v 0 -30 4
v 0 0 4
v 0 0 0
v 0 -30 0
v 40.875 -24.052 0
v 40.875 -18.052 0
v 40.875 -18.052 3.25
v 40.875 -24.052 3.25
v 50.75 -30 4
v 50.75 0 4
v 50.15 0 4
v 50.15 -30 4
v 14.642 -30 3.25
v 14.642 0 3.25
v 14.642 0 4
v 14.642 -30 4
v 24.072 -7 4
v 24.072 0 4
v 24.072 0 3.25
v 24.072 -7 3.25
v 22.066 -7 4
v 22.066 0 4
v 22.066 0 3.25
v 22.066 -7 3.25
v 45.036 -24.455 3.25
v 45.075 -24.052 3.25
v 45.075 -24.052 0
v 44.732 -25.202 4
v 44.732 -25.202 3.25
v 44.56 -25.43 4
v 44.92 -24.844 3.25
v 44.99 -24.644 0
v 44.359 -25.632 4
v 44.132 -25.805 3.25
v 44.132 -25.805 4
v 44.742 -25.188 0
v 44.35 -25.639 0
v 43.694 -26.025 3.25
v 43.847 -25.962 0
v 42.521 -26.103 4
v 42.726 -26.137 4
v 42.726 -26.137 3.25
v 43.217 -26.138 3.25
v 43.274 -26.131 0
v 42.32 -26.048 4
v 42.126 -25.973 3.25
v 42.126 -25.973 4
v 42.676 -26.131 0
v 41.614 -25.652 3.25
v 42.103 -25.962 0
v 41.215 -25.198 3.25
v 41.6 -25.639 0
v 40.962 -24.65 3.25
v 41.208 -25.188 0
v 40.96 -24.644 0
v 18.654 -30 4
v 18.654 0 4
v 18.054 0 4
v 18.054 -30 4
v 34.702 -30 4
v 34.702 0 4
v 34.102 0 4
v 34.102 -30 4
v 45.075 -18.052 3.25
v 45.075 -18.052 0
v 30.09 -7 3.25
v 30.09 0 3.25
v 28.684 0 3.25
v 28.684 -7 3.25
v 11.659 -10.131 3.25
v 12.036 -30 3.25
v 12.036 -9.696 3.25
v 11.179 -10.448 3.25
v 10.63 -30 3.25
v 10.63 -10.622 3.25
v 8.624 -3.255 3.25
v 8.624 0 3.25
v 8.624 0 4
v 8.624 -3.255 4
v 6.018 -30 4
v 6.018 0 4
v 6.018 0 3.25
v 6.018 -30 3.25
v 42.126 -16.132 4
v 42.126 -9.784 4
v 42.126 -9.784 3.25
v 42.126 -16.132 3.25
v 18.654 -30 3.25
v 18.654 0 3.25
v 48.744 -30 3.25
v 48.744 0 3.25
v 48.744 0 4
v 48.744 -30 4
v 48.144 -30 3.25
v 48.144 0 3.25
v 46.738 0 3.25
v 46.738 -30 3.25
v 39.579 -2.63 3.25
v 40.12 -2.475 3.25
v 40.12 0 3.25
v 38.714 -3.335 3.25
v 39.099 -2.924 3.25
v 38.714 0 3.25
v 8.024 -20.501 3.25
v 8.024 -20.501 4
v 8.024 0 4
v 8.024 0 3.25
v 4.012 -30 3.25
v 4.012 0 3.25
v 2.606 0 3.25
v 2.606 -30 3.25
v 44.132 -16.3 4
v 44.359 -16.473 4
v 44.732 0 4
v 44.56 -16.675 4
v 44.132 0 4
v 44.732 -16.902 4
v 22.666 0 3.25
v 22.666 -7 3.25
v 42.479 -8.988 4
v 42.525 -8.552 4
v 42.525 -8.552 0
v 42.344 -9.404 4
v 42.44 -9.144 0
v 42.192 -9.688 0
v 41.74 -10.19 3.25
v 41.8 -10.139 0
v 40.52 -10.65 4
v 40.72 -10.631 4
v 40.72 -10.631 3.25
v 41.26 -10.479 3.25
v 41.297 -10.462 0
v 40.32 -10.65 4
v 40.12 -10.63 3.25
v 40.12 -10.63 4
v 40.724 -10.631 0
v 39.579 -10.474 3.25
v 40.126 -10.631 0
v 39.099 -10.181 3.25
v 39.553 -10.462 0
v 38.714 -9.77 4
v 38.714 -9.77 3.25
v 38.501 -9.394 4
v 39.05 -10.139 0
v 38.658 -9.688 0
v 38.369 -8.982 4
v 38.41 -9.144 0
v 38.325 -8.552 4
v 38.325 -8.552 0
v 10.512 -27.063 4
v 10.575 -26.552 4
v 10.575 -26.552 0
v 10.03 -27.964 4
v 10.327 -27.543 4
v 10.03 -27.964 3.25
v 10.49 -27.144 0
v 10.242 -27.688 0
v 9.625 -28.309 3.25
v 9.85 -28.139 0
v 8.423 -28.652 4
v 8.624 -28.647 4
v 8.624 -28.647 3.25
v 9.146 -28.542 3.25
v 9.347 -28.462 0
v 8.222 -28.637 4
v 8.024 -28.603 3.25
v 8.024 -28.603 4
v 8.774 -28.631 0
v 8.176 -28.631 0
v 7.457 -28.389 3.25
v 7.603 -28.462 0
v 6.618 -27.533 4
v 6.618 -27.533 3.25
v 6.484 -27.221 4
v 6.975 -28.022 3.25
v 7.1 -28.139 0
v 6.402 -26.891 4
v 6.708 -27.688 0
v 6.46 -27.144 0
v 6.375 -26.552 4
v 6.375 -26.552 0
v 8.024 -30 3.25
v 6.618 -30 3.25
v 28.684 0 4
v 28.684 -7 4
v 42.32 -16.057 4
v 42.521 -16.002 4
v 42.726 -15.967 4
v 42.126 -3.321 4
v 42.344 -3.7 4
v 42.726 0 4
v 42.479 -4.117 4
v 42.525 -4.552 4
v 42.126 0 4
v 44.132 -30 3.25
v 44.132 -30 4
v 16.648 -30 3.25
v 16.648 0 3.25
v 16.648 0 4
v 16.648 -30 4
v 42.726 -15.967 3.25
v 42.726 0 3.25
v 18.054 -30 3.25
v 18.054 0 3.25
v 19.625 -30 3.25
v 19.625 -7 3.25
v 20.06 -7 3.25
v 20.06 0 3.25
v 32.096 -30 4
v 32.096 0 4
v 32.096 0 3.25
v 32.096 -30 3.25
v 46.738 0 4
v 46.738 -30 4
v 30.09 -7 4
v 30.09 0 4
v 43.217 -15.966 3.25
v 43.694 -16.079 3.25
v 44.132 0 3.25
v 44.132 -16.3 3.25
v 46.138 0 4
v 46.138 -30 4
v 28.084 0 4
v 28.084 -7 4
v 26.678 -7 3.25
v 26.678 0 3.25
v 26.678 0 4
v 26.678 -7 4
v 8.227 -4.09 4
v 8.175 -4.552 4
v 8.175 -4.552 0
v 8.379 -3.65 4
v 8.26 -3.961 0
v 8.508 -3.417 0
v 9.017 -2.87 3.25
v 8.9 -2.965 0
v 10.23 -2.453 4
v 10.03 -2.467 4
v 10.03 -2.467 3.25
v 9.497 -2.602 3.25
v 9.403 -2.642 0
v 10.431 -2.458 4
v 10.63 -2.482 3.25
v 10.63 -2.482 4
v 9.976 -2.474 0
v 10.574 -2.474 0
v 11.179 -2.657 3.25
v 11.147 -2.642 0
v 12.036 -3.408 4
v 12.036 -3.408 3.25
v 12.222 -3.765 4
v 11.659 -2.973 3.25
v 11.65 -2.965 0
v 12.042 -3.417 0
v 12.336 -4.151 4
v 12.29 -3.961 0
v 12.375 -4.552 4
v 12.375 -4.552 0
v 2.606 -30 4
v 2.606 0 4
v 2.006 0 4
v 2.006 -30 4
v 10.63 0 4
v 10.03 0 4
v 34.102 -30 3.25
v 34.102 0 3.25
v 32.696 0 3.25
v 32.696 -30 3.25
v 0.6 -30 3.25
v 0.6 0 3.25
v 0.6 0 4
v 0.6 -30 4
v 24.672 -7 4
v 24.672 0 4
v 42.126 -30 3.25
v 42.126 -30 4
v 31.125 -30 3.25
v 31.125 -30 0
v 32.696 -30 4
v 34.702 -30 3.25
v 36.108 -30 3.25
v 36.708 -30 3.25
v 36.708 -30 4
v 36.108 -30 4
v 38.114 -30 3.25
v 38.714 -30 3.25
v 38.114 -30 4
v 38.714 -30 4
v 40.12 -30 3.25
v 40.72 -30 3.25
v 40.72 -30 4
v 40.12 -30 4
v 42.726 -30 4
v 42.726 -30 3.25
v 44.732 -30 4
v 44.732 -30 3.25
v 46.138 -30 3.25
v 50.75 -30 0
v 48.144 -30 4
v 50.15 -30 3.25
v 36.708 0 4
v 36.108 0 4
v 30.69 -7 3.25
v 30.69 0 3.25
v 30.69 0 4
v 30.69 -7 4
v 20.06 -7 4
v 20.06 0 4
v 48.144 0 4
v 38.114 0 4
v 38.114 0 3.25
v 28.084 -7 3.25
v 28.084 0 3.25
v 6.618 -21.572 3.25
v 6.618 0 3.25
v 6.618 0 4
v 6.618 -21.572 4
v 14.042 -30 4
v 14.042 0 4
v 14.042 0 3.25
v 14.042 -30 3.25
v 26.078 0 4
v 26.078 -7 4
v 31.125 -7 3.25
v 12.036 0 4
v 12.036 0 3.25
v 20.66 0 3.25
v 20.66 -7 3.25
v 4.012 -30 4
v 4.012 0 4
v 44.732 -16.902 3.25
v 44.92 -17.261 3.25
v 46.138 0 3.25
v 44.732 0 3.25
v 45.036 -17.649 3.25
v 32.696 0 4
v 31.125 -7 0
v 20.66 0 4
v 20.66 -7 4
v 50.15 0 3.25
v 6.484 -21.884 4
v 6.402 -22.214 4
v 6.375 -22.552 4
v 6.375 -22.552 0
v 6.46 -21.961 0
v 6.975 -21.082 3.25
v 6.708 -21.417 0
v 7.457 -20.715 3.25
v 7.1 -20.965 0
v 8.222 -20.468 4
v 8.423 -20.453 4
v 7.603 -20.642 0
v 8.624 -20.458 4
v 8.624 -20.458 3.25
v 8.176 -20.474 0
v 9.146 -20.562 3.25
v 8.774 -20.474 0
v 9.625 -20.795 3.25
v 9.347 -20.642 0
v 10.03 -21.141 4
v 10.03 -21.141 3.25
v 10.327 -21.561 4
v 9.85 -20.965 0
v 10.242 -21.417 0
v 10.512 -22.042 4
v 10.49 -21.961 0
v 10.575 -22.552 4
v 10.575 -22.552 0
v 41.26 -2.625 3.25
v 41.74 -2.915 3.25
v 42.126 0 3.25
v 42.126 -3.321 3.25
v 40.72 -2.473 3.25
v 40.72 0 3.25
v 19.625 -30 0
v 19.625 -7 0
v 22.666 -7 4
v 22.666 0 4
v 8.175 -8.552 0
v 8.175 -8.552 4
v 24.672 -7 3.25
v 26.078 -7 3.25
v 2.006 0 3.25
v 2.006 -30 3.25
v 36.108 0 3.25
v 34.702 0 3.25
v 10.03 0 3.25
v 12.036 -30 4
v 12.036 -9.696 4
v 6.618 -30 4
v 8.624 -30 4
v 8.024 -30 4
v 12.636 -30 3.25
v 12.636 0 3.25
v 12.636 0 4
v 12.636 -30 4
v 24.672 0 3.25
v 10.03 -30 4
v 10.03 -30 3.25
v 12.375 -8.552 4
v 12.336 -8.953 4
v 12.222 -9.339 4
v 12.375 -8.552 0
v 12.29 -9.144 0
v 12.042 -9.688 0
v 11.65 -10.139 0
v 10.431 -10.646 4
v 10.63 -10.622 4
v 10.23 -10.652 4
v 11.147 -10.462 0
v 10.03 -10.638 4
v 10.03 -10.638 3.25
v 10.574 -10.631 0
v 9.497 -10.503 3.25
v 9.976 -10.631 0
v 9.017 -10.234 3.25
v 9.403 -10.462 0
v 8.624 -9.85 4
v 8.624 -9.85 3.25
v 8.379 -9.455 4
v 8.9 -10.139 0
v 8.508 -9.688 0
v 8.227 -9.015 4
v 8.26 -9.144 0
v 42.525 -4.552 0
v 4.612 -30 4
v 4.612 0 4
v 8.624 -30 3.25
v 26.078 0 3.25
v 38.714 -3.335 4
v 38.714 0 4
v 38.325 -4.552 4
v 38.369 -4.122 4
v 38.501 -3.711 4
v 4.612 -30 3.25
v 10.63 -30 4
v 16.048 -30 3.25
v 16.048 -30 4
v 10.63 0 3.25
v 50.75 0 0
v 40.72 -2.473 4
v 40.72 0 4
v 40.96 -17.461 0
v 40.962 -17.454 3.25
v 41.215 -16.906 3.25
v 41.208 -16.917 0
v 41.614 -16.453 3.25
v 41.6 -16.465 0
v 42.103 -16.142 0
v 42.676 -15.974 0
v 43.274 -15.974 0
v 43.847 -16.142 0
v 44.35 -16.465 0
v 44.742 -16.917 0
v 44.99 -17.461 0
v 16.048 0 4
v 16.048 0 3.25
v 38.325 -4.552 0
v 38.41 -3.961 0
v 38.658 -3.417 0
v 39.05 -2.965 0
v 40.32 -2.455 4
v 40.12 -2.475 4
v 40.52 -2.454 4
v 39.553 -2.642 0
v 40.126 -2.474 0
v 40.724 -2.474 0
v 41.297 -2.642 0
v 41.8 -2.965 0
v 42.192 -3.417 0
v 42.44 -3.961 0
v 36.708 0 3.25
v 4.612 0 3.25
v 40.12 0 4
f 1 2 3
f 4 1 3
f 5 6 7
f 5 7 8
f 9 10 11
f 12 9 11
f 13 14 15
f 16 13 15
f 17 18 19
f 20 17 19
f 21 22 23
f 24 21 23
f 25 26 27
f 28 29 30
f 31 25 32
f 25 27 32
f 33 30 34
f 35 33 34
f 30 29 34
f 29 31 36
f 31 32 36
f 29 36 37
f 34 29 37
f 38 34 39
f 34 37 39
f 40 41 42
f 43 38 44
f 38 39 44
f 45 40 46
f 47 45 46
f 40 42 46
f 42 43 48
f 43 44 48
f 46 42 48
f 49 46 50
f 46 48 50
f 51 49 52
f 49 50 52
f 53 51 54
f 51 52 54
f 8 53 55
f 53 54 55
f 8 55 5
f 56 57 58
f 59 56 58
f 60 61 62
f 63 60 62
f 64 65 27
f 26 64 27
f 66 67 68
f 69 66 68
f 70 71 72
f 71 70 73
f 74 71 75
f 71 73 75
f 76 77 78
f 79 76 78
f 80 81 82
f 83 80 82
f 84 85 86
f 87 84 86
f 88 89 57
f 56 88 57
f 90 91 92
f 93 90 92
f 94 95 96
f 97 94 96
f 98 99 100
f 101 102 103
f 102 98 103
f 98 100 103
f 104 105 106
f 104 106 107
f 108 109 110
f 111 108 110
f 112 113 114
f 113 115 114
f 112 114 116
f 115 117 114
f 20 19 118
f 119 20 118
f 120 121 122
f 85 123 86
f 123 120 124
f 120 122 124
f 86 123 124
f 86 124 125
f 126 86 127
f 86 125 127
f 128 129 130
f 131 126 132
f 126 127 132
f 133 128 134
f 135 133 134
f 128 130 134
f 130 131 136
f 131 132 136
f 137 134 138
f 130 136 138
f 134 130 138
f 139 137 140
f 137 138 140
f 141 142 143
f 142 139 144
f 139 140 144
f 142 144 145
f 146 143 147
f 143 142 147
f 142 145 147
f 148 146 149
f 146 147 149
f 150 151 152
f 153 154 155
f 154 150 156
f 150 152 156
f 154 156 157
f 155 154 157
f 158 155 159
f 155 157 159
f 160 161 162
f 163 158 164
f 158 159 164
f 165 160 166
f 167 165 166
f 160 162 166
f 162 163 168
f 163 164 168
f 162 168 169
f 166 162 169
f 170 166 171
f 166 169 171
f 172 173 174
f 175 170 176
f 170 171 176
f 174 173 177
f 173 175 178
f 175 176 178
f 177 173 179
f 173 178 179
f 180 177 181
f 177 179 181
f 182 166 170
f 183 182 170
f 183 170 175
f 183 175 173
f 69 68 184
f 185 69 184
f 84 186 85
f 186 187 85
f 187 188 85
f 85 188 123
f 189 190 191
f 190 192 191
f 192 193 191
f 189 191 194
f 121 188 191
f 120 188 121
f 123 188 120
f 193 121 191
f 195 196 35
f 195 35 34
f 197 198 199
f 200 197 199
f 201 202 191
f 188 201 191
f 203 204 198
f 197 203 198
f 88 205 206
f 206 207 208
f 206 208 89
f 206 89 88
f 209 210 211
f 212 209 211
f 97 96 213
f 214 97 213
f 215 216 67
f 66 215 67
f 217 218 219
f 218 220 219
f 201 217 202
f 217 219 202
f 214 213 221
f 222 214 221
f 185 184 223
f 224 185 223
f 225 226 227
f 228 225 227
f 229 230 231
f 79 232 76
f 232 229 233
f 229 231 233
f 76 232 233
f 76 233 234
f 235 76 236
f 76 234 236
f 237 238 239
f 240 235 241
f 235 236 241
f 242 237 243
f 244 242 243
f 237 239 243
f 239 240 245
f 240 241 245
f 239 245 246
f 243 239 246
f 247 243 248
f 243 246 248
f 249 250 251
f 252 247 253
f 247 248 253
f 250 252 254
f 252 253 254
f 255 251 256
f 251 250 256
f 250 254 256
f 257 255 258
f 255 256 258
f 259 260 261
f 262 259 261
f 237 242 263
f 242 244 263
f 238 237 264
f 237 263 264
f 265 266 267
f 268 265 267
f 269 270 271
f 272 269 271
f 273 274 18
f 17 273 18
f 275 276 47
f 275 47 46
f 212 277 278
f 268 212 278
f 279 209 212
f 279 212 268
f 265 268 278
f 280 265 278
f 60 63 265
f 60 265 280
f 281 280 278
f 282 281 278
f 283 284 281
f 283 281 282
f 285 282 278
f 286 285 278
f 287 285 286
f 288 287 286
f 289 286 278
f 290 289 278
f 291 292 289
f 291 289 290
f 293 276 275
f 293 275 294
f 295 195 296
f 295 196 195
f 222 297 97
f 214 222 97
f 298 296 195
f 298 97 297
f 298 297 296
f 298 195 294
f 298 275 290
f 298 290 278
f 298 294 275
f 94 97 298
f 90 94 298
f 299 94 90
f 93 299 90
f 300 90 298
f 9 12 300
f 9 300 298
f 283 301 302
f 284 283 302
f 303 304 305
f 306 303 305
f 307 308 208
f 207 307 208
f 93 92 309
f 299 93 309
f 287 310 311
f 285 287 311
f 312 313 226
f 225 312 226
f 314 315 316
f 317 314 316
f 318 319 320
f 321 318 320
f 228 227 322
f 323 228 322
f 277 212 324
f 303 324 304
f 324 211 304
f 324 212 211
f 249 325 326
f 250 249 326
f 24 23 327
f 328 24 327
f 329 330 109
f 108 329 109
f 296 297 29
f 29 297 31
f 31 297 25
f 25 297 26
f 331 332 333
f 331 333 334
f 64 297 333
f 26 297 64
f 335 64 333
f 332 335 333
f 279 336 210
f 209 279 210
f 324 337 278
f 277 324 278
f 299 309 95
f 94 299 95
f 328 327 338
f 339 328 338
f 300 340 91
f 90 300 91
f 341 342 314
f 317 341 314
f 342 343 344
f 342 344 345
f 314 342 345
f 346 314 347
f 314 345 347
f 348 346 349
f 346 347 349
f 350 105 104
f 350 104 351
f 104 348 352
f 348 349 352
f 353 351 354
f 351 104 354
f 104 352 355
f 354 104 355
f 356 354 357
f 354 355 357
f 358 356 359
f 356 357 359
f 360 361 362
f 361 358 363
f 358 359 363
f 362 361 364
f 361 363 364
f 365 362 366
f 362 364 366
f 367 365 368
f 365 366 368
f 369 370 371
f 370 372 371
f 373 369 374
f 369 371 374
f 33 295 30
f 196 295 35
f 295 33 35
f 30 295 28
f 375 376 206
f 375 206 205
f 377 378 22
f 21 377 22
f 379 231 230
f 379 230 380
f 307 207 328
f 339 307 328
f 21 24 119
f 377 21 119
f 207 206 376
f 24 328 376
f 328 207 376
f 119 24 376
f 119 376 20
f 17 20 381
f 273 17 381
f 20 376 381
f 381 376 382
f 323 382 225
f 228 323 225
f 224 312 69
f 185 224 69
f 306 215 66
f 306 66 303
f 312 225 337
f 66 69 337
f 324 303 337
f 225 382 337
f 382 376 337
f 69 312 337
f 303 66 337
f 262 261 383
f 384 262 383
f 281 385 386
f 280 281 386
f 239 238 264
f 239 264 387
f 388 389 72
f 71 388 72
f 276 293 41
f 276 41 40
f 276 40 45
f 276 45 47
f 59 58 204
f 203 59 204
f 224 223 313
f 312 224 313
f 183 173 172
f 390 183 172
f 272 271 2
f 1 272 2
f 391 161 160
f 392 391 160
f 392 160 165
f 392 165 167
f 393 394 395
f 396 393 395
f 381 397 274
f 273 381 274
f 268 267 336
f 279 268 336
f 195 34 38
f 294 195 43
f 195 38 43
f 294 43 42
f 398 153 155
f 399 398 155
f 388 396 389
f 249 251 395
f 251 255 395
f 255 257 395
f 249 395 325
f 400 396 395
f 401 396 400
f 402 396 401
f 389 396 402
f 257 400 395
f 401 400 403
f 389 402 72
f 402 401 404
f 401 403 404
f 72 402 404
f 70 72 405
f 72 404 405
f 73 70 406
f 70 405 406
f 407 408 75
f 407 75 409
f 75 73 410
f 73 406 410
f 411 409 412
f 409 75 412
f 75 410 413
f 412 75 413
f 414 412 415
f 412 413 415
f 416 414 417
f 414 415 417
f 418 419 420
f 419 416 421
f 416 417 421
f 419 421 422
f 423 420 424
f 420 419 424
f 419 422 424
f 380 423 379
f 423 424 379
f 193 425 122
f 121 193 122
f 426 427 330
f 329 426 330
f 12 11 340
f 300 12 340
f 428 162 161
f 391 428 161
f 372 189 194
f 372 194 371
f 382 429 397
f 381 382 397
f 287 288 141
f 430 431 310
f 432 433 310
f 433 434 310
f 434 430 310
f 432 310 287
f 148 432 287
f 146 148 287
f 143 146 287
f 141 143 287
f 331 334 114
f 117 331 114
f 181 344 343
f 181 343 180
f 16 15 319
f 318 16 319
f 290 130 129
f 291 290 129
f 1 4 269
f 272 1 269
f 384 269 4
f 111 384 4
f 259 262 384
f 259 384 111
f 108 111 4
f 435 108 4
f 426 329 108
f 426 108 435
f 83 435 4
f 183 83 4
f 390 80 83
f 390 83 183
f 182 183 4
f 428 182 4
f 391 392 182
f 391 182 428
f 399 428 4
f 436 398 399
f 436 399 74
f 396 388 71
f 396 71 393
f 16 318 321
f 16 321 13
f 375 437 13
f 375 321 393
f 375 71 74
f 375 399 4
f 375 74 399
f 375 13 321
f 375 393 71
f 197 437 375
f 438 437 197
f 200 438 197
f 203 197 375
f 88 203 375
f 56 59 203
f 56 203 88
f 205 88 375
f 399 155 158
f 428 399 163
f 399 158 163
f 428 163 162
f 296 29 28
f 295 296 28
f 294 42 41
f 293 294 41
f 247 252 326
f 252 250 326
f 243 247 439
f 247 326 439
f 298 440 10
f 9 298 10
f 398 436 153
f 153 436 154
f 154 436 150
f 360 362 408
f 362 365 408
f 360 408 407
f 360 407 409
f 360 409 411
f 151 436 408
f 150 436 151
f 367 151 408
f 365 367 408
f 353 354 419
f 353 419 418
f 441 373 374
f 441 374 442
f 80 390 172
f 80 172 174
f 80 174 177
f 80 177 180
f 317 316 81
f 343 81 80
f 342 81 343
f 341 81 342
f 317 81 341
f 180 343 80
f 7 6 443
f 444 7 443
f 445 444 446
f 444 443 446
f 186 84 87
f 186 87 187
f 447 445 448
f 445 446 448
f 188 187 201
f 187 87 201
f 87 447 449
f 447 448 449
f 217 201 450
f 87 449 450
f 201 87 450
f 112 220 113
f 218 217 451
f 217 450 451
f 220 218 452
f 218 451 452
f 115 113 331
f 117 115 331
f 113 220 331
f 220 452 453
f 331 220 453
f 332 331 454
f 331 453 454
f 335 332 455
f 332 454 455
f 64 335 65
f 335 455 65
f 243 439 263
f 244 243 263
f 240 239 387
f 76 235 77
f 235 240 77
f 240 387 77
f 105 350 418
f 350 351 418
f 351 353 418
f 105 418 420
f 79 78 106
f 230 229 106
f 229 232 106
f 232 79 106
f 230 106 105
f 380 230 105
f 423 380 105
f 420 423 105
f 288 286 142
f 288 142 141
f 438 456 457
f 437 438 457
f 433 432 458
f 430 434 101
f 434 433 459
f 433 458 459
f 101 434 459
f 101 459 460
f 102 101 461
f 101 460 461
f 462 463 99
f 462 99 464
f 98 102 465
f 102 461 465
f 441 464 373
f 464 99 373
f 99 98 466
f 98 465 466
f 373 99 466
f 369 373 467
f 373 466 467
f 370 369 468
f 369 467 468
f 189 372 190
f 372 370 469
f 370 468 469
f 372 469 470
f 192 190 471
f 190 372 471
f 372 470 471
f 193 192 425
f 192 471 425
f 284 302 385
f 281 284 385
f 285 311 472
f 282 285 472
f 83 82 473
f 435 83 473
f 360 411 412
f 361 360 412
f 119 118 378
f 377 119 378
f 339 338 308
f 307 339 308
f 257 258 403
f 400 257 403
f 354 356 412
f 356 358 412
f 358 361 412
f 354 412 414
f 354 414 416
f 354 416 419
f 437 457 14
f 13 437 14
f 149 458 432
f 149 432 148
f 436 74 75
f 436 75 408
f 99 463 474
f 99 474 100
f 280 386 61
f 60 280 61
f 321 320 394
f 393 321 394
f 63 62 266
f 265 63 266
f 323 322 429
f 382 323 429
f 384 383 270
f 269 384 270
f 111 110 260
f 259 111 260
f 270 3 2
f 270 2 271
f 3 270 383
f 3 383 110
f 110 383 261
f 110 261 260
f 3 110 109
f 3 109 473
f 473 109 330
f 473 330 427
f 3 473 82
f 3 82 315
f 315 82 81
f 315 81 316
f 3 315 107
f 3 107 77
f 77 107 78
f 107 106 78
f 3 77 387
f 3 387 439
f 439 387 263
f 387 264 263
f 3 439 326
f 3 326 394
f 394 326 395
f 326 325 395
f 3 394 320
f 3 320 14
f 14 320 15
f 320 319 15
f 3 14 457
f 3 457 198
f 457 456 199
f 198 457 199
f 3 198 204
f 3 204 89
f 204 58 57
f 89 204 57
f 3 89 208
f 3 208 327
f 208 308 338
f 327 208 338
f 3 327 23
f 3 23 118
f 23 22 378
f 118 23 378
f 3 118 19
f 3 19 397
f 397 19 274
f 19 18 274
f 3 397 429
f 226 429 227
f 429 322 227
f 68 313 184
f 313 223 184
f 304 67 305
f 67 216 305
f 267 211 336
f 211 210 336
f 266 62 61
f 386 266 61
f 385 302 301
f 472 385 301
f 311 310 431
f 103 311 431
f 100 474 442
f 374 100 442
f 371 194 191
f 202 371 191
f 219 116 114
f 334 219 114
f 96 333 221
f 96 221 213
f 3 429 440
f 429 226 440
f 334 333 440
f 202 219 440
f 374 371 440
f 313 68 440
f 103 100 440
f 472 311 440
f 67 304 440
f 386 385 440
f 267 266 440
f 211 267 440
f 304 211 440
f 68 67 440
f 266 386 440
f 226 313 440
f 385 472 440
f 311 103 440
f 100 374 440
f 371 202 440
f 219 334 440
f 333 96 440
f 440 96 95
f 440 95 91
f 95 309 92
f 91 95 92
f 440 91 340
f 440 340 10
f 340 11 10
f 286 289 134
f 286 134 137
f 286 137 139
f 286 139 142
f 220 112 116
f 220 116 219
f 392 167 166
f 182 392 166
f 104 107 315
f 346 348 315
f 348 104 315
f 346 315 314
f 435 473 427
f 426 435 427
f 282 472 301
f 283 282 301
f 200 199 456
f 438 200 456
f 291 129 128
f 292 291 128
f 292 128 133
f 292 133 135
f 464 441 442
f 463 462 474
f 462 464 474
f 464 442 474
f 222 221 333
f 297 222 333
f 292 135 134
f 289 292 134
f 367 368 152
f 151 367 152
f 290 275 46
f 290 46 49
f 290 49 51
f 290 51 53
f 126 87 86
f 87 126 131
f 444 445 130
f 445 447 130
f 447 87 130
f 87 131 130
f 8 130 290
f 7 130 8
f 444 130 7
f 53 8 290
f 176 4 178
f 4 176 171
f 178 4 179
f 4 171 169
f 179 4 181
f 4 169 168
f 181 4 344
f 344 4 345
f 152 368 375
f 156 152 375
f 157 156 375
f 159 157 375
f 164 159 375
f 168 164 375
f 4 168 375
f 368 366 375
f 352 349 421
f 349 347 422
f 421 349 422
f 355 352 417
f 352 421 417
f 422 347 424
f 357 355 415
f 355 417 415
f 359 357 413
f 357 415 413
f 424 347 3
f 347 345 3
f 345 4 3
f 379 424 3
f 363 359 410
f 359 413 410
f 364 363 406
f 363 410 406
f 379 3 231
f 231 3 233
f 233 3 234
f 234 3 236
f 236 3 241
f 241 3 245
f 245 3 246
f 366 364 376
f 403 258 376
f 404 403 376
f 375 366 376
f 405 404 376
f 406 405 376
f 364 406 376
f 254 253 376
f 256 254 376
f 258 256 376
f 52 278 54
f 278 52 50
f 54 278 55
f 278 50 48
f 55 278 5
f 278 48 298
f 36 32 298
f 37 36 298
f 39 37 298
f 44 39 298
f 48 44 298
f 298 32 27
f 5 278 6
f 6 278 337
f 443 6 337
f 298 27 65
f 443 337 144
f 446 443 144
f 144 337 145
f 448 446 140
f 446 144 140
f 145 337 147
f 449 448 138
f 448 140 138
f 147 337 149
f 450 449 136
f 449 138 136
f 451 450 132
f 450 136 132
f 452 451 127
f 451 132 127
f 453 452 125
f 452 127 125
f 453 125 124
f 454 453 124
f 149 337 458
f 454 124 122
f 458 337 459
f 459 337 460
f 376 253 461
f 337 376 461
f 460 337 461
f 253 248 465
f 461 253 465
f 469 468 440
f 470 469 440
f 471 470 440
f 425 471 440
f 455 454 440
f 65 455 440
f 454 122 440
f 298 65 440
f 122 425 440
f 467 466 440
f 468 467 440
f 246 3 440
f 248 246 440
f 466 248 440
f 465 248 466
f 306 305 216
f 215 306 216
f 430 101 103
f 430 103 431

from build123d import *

# Parameters (mm, degrees)
F1_DEPTH = 30
F2_W     = 5.75
F2_H     = 23
F3_DEPTH = 4
F2_W_2   = 4.2
F2_H_2   = 4
F2_H_3   = 6
F4_DEPTH = 4


with BuildPart() as f1:
    # F0 (on Front) → F1 (new body)
    with BuildSketch(Plane.XZ):
        Polygon((0, 4), (0, 0), (50.75, 0), (50.75, 3.25), (50.75, 4), (50.15, 4), (50.15, 3.25), (48.744, 3.25), (48.744, 4), (48.144, 4), (48.144, 3.25), (46.738, 3.25), (46.738, 4), (46.138, 4), (46.138, 3.25), (44.732, 3.25), (44.732, 4), (44.132, 4), (44.132, 3.25), (42.726, 3.25), (42.726, 4), (42.126, 4), (42.126, 3.25), (40.72, 3.25), (40.72, 4), (40.12, 4), (40.12, 3.25), (38.714, 3.25), (38.714, 4), (38.114, 4), (38.114, 3.25), (36.708, 3.25), (36.708, 4), (36.108, 4), (36.108, 3.25), (34.702, 3.25), (34.702, 4), (34.102, 4), (34.102, 3.25), (32.696, 3.25), (32.696, 4), (32.096, 4), (32.096, 3.25), (30.69, 3.25), (30.69, 4), (30.09, 4), (30.09, 3.25), (28.684, 3.25), (28.684, 4), (28.084, 4), (28.084, 3.25), (26.678, 3.25), (26.678, 4), (26.078, 4), (26.078, 3.25), (24.672, 3.25), (24.672, 4), (24.072, 4), (24.072, 3.25), (22.666, 3.25), (22.666, 4), (22.066, 4), (22.066, 3.25), (20.66, 3.25), (20.66, 4), (20.06, 4), (20.06, 3.25), (18.654, 3.25), (18.654, 4), (18.054, 4), (18.054, 3.25), (16.648, 3.25), (16.648, 4), (16.048, 4), (16.048, 3.25), (14.642, 3.25), (14.642, 4), (14.042, 4), (14.042, 3.25), (12.636, 3.25), (12.636, 4), (12.036, 4), (12.036, 3.25), (10.63, 3.25), (10.63, 4), (10.03, 4), (10.03, 3.25), (8.624, 3.25), (8.624, 4), (8.324, 4), (8.024, 4), (8.024, 3.25), (6.618, 3.25), (6.618, 4), (6.318, 4), (6.018, 4), (6.018, 3.25), (4.612, 3.25), (4.612, 4), (4.012, 4), (4.012, 3.25), (2.606, 3.25), (2.606, 4), (2.006, 4), (2.006, 3.25), (0.6, 3.25), (0.6, 4), align=None)
    extrude(amount=F1_DEPTH)

    # F2 (on face) → F3 (cut, through all)
    with BuildSketch(Plane(origin=(0, 0, 0), x_dir=(1, 0, 0), z_dir=(0, 0, -1))):
        with Locations((22.5, 18.5)):
            Rectangle(F2_W, F2_H)
        with Locations((28.25, 18.5)):
            Rectangle(F2_W, F2_H)
    extrude(amount=-F3_DEPTH, mode=Mode.SUBTRACT)

    # F2 (on face) → F4 (cut, through all)
    with BuildSketch(Plane(origin=(0, 0, 0), x_dir=(1, 0, 0), z_dir=(0, 0, -1))):
        with BuildLine():
            ThreePointArc((12.375, 8.55227), (10.275, 10.65227), (8.175, 8.55227))
            Line((8.175, 8.55227), (12.375, 8.55227))
        make_face()
        with Locations((10.275, 6.55227)):
            Rectangle(F2_W_2, F2_H_2)
        with BuildLine():
            Line((12.375, 4.55227), (8.175, 4.55227))
            ThreePointArc((8.175, 4.55227), (10.275, 2.45227), (12.375, 4.55227))
        make_face()
        with BuildLine():
            ThreePointArc((42.525, 8.55227), (40.425, 10.65227), (38.325, 8.55227))
            Line((38.325, 8.55227), (42.525, 8.55227))
        make_face()
        with Locations((40.425, 6.55227)):
            Rectangle(F2_W_2, F2_H_2)
        with BuildLine():
            Line((42.525, 4.55227), (38.325, 4.55227))
            ThreePointArc((38.325, 4.55227), (40.425, 2.45227), (42.525, 4.55227))
        make_face()
        with BuildLine():
            ThreePointArc((10.575, 26.55227), (8.475, 28.65227), (6.375, 26.55227))
            Line((6.375, 26.55227), (10.575, 26.55227))
        make_face()
        with Locations((8.475, 24.55227)):
            Rectangle(F2_W_2, F2_H_2)
        with BuildLine():
            Line((10.575, 22.55227), (6.375, 22.55227))
            ThreePointArc((6.375, 22.55227), (8.475, 20.45227), (10.575, 22.55227))
        make_face()
        with BuildLine():
            ThreePointArc((45.075, 24.05227), (42.975, 26.15227), (40.875, 24.05227))
            Line((40.875, 24.05227), (45.075, 24.05227))
        make_face()
        with Locations((42.975, 21.05227)):
            Rectangle(F2_W_2, F2_H_3)
        with BuildLine():
            Line((45.075, 18.05227), (40.875, 18.05227))
            ThreePointArc((40.875, 18.05227), (42.975, 15.95227), (45.075, 18.05227))
        make_face()
    extrude(amount=-F4_DEPTH, mode=Mode.SUBTRACT)


solid = f1.part
